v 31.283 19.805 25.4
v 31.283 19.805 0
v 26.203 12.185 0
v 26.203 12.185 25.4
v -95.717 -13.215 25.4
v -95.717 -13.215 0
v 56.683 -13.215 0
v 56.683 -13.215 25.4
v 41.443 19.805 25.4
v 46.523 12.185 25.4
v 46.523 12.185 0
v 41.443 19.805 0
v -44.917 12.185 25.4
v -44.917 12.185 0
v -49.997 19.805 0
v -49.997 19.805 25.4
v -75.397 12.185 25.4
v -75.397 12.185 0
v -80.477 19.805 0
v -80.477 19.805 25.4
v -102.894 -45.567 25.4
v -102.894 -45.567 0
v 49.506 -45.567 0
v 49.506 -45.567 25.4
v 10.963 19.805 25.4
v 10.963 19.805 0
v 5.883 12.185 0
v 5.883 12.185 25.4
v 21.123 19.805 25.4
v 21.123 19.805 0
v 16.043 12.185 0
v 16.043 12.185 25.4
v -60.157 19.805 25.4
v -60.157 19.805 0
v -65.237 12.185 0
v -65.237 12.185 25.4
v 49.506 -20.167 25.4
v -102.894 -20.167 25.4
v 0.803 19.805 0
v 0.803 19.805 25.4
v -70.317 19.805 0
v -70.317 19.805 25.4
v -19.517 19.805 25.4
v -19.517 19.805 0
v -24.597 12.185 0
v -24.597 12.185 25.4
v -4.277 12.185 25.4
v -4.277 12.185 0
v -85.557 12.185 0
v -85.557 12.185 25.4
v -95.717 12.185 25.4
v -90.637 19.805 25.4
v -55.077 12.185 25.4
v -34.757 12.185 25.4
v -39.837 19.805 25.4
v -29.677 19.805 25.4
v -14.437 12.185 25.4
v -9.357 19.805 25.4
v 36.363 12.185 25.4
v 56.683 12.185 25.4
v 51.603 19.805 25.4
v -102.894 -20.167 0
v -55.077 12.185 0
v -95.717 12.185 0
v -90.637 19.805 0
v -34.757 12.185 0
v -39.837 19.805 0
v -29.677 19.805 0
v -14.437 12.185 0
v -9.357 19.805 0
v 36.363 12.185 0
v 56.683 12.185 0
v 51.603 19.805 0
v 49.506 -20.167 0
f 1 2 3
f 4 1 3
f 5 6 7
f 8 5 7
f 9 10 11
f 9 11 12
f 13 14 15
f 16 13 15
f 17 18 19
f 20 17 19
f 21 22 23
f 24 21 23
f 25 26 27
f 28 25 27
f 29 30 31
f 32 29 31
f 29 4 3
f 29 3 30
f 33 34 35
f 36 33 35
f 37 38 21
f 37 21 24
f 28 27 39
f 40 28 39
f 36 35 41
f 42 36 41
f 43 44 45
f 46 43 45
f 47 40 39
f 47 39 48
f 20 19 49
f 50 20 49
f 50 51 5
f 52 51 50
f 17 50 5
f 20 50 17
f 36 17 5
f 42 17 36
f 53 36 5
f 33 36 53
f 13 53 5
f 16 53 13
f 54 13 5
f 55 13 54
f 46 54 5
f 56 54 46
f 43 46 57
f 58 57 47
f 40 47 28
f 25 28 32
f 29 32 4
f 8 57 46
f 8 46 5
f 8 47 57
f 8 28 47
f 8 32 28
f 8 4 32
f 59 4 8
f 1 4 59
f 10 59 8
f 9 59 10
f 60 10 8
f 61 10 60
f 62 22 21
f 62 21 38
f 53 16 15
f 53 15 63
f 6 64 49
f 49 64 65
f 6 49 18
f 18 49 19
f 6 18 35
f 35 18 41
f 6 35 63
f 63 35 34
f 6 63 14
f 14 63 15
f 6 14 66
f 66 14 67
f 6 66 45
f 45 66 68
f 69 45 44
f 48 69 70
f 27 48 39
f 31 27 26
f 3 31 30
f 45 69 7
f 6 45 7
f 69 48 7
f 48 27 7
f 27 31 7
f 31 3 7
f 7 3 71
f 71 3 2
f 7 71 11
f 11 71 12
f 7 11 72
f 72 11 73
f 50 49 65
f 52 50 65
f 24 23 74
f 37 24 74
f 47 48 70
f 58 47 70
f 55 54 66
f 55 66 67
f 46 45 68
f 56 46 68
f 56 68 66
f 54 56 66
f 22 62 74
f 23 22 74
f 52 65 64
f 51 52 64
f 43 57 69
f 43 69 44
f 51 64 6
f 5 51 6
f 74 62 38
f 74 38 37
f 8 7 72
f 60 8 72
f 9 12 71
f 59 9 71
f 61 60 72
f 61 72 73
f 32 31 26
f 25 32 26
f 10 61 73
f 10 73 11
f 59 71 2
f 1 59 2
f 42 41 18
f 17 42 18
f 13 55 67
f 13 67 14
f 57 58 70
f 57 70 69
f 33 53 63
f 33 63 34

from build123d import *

# Parameters (mm, degrees)
F1_DEPTH = 25.4
F2_W     = 152.4
F2_H     = 25.4
F3_DEPTH = 25.4


with BuildPart() as f1:
    # F0 (on Top) → F1 (new body)
    with BuildSketch(Plane.XY):
        Polygon((-90.636844, 19.805351), (-90.636844, 12.185351), (-85.556844, 12.185351), align=None)
        Polygon((-90.636844, 19.805351), (-95.716844, 12.185351), (-90.636844, 12.185351), align=None)
        Polygon((-80.476844, 19.805351), (-85.556844, 12.185351), (-75.396844, 12.185351), align=None)
        Polygon((-70.316844, 19.805351), (-75.396844, 12.185351), (-65.236844, 12.185351), align=None)
        Polygon((-60.156844, 19.805351), (-65.236844, 12.185351), (-55.076844, 12.185351), align=None)
        Polygon((-49.996844, 19.805351), (-55.076844, 12.185351), (-44.916844, 12.185351), align=None)
        Polygon((-44.916844, 12.185351), (-34.756844, 12.185351), (-39.836844, 19.805351), align=None)
        Polygon((-34.756844, 12.185351), (-24.596844, 12.185351), (-29.676844, 19.805351), align=None)
        Polygon((-24.596844, 12.185351), (-14.436844, 12.185351), (-19.516844, 19.805351), align=None)
        Polygon((-14.436844, 12.185351), (-4.276844, 12.185351), (-9.356844, 19.805351), align=None)
        Polygon((-4.276844, 12.185351), (5.883156, 12.185351), (0.803156, 19.805351), align=None)
        Polygon((5.883156, 12.185351), (16.043156, 12.185351), (10.963156, 19.805351), align=None)
        Polygon((16.043156, 12.185351), (26.203156, 12.185351), (21.123156, 19.805351), align=None)
        Polygon((26.203156, 12.185351), (36.363156, 12.185351), (31.283156, 19.805351), align=None)
        Polygon((36.363156, 12.185351), (46.523156, 12.185351), (41.443156, 19.805351), align=None)
        Polygon((46.523156, 12.185351), (56.683156, 12.185351), (51.603156, 19.805351), align=None)
        Polygon((56.683156, -13.214649), (56.683156, 12.185351), (46.523156, 12.185351), (36.363156, 12.185351), (26.203156, 12.185351), (16.043156, 12.185351), (5.883156, 12.185351), (-4.276844, 12.185351), (-14.436844, 12.185351), (-24.596844, 12.185351), (-34.756844, 12.185351), (-44.916844, 12.185351), (-55.076844, 12.185351), (-65.236844, 12.185351), (-75.396844, 12.185351), (-85.556844, 12.185351), (-90.636844, 12.185351), (-95.716844, 12.185351), (-95.716844, -13.214649), align=None)
    extrude(amount=F1_DEPTH)


with BuildPart() as f3:
    # F2 (on Top) → F3 (new body)
    with BuildSketch(Plane.XY):
        with Locations((-26.693689, -32.867122)):
            Rectangle(F2_W, F2_H)
    extrude(amount=F3_DEPTH)


solid = Compound([f1.part, f3.part])
